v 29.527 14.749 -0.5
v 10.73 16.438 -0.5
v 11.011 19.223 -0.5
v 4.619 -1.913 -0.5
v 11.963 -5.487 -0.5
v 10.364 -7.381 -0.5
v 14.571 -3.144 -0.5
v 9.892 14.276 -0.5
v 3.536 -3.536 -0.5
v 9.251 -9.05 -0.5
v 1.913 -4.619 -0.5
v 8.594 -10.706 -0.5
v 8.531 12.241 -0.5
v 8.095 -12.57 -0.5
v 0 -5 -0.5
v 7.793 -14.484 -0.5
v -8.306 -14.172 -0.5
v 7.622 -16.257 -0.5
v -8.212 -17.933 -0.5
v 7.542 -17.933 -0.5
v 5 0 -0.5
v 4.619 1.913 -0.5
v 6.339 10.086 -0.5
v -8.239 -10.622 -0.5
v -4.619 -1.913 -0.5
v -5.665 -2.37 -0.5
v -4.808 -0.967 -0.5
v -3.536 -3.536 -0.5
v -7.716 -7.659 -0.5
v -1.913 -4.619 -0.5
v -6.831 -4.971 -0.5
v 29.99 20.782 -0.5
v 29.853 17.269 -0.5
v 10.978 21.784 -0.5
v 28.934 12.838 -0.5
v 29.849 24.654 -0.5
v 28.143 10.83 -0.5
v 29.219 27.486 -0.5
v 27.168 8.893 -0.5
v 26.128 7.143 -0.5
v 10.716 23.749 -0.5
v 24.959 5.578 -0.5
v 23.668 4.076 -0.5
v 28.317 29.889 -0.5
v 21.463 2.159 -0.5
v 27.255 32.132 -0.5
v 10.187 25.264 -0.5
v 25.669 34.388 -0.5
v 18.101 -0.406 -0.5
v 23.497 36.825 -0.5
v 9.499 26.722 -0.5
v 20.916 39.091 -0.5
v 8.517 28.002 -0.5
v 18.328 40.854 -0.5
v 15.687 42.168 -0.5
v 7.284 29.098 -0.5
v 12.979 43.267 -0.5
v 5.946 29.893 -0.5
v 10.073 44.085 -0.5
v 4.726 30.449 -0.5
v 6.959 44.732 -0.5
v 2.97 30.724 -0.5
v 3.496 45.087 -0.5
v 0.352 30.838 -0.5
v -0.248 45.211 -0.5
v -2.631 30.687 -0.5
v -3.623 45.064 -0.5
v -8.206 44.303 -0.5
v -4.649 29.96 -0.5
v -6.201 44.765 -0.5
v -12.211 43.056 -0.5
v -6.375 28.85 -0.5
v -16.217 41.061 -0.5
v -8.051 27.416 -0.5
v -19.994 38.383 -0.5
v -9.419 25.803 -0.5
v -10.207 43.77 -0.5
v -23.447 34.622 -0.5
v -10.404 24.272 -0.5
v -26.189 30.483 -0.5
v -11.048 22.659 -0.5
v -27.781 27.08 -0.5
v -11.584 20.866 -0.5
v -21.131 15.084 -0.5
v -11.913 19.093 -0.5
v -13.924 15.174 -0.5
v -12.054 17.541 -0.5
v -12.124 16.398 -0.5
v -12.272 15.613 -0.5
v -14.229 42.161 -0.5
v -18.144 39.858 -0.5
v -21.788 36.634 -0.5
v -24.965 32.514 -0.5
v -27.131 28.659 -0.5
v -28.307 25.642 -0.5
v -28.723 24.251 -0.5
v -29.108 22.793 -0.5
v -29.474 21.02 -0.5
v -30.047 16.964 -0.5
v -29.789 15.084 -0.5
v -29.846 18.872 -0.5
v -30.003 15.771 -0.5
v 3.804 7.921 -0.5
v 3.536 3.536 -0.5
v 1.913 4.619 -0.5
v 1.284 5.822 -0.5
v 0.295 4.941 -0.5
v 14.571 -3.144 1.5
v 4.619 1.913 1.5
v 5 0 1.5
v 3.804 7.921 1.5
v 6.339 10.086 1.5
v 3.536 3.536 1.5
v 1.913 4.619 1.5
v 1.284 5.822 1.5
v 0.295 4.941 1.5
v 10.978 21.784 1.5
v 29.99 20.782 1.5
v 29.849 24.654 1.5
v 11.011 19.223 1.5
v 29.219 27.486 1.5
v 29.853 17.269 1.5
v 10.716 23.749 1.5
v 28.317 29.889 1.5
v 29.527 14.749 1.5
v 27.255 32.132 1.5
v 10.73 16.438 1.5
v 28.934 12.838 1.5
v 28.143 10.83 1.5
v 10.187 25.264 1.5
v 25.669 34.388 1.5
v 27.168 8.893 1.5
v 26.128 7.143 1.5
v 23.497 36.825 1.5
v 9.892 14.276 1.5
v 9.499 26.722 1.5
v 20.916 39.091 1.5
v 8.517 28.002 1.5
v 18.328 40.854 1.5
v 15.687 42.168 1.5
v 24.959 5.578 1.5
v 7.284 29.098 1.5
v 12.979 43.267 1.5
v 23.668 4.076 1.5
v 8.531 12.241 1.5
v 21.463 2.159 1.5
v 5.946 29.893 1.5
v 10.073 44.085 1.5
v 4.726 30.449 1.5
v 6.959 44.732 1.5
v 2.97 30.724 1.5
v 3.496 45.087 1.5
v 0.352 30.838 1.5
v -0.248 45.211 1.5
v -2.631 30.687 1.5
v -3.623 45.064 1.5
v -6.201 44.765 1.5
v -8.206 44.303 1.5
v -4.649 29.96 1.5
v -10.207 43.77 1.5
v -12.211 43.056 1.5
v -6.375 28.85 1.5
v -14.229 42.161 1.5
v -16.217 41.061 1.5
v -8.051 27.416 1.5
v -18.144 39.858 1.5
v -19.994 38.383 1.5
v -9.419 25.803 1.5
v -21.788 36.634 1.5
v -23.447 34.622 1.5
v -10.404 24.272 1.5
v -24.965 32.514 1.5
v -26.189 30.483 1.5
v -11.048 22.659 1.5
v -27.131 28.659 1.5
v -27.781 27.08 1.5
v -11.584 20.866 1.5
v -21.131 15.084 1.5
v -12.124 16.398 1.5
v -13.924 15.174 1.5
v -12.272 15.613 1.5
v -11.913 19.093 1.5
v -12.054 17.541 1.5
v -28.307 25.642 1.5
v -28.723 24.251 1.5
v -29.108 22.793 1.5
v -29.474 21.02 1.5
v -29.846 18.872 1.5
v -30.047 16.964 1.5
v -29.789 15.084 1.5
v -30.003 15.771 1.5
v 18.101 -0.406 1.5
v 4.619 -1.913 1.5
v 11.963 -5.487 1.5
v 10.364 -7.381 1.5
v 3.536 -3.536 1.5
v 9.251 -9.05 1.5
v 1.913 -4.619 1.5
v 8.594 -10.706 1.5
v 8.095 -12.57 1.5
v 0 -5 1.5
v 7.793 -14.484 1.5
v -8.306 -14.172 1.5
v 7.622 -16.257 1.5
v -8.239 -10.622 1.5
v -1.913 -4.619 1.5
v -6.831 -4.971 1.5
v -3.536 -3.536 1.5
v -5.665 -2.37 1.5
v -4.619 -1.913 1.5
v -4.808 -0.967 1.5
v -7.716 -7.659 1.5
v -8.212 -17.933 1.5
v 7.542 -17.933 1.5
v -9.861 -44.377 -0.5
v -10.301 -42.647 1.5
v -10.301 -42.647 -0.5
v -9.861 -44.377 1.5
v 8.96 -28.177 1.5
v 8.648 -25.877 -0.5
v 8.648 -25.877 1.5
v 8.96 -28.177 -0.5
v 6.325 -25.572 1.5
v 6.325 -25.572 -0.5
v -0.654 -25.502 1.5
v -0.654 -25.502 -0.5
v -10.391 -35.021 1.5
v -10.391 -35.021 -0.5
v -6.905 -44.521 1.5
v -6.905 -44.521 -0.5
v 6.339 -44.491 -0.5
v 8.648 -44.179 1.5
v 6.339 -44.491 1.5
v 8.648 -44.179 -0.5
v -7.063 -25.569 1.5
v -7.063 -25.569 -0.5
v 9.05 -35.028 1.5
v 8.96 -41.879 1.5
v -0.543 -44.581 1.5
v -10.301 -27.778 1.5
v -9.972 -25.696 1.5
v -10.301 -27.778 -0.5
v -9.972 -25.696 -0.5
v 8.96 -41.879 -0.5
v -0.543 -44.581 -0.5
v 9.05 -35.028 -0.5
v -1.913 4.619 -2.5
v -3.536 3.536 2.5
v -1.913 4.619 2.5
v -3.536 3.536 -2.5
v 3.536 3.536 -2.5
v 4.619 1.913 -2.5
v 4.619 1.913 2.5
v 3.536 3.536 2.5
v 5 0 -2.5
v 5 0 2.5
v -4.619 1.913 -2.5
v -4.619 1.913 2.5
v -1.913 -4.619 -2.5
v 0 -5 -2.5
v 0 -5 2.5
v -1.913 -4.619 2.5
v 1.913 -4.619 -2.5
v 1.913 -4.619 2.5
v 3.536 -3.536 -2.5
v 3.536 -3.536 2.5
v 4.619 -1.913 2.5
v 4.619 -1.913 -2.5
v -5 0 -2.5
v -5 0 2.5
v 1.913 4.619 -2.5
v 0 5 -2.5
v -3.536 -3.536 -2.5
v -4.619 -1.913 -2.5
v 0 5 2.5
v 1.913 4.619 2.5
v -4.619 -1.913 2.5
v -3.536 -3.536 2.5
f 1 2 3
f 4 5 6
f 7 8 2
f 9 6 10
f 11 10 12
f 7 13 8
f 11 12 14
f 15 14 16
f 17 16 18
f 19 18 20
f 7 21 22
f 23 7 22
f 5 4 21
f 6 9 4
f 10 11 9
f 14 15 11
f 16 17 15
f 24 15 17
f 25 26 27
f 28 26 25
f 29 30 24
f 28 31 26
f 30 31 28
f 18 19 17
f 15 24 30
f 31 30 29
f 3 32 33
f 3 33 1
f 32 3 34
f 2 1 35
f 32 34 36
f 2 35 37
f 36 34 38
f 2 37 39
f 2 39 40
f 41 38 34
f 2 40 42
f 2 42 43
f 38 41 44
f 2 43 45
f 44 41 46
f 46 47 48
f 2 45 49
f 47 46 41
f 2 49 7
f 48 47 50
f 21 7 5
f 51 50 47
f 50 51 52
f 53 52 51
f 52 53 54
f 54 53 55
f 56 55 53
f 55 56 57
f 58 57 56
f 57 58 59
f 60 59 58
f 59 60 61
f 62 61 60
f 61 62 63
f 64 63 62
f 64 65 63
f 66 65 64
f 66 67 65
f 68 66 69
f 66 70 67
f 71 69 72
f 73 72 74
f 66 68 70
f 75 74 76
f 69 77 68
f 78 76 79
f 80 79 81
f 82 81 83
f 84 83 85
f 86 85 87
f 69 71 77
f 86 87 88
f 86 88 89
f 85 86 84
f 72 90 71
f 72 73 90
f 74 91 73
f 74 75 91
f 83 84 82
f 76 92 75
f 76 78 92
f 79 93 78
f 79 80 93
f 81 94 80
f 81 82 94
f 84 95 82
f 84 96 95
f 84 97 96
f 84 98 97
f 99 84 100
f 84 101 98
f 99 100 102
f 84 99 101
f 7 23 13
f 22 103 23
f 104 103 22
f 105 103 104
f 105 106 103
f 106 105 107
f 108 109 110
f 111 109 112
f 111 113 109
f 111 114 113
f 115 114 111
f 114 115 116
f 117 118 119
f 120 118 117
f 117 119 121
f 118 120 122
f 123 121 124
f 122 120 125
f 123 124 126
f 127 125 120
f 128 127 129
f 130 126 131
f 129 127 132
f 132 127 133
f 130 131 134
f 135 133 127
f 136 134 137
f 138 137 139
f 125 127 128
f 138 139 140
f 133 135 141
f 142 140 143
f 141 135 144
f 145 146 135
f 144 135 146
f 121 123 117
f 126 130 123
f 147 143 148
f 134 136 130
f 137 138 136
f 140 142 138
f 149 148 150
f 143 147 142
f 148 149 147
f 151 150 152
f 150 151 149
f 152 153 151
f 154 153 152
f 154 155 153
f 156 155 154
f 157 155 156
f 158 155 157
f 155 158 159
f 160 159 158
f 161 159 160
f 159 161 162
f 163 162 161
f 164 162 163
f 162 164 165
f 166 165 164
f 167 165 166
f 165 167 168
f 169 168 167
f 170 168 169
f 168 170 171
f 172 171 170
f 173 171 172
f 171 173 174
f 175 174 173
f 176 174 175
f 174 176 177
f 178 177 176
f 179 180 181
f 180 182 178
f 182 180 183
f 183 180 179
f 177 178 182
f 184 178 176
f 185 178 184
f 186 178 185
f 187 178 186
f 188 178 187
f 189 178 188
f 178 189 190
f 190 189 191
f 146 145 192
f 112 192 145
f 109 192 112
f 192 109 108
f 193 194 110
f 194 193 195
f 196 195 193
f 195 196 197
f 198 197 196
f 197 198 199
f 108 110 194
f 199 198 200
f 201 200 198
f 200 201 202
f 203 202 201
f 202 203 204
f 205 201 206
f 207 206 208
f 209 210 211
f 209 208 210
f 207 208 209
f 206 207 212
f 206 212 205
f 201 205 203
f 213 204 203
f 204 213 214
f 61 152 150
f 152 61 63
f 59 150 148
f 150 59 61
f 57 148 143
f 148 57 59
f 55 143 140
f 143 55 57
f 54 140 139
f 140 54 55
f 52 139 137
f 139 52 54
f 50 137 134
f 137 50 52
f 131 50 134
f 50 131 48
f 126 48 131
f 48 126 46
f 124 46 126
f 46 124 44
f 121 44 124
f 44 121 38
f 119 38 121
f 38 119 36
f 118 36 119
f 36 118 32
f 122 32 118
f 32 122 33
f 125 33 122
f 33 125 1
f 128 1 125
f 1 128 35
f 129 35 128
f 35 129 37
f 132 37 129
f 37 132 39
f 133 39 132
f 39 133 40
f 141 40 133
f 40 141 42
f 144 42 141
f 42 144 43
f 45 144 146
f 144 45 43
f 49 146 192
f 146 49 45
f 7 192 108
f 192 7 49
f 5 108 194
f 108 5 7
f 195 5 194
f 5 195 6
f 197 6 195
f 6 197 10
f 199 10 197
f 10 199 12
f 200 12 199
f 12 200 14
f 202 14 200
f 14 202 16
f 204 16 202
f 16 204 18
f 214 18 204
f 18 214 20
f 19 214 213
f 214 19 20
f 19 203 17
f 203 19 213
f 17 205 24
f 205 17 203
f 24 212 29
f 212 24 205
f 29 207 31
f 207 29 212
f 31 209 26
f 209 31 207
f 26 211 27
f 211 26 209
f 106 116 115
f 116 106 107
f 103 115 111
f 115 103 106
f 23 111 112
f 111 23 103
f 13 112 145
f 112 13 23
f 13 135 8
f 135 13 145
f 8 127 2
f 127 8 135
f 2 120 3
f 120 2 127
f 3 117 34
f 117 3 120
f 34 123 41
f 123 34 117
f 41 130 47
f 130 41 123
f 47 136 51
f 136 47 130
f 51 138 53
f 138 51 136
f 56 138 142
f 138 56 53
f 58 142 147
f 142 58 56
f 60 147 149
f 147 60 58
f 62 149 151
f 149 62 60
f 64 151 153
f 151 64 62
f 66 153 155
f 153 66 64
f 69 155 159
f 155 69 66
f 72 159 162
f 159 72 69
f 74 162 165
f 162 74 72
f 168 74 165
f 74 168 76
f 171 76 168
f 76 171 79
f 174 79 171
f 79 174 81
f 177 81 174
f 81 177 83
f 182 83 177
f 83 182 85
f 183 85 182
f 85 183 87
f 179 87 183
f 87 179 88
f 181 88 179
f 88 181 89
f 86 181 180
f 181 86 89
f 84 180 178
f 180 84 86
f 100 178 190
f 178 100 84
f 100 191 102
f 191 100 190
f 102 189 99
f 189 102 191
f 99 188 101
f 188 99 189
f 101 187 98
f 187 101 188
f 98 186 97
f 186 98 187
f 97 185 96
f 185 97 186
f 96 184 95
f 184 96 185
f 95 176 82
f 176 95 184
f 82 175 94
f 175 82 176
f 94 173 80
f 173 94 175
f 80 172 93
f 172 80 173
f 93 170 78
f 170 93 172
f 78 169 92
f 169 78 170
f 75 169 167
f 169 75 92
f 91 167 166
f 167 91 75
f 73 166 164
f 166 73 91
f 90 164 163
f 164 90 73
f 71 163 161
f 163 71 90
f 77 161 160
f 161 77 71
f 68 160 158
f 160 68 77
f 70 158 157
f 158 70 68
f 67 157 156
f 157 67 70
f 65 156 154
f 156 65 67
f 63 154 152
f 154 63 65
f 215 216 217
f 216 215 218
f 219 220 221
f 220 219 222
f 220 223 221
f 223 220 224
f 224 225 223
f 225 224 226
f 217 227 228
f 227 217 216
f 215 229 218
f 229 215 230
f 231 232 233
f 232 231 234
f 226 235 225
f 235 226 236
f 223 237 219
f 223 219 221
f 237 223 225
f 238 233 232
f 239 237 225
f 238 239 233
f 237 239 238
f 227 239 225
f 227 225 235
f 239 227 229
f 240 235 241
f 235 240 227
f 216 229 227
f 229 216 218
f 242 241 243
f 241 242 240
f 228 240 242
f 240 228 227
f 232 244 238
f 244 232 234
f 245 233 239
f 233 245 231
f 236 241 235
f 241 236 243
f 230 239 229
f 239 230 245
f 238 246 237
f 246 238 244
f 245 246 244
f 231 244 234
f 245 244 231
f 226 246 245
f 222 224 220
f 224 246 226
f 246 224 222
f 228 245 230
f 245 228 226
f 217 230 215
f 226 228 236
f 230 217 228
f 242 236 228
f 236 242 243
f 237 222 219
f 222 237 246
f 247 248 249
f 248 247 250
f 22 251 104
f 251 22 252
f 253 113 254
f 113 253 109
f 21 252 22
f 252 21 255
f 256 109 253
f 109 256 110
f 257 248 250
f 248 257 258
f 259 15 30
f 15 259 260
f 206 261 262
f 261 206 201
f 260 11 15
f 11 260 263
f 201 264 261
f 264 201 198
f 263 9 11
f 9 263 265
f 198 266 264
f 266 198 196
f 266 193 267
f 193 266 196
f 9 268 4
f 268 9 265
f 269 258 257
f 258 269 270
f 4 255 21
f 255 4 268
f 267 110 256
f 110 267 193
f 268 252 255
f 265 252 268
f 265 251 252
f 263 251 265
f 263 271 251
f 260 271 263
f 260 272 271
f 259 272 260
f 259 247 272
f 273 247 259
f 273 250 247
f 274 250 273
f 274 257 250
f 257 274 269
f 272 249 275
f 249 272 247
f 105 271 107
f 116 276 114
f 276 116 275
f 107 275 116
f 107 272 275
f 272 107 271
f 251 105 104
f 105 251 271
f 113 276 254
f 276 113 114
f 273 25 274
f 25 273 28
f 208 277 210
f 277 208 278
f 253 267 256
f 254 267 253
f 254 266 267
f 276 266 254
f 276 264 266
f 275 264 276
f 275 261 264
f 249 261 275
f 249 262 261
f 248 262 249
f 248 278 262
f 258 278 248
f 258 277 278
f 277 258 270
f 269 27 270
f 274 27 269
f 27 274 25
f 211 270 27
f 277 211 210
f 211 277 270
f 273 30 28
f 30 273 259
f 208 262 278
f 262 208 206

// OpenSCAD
//------------------------------------------------------------
//	Stencil-o-Matic (modified for RossRobotics)
//
//	input comes from:
//	http://chaaawa.com/stencil_factory/
//
//	http://thingiverse.com/Benjamin
//	http://www.thingiverse.com/thing:55821
//------------------------------------------------------------

// preview[view:south, tilt:top]

// paste here after "Convert&Copy"
input = "no_input";

stencil_thickness = 1;
stencil_width = 80;
//for margin
margin = 10;

// If you don't want to center
offX = 0;
offY = 0;

module void() {}

cylinder(5,5,5, center=true);

dispo_width = stencil_width - 2*margin;

points_array = (input=="no_input"? [[179,268],[[199.26,15.12],[189.19,15.56],[181.5,16.45],[175.52,17.83],[169.55,19.42],[163.57,21.55],[157.55,24.22],[151.62,27.5],[145.87,31.09],[140.35,35.49],[135,40.71],[130.05,46.71],[125.52,53],[121.87,59.06],[119.06,64.5],[117.12,69.21],[115.55,73.5],[114.31,77.65],[113.16,82],[112.07,87.29],[110.96,93.7],[110.36,99.39],[110.49,102.95],[111.13,105],[136.96,105],[158.46,104.73],[163.39,103.42],[163.83,101.08],[164.04,97.67],[164.46,93.04],[165.44,87.75],[167.04,82.4],[168.96,77.59],[171.9,73.02],[175.98,68.21],[180.98,63.93],[186.13,60.62],[192.15,58.45],[201.05,58],[208.86,58.34],[214.1,59.16],[217.74,60.82],[221.73,63.19],[225.41,66.46],[228.34,70.28],[230.39,74.63],[231.97,79.15],[232.75,85.01],[232.85,92.65],[232.01,100.96],[229.51,107.41],[225.45,113.48],[218.91,119.91],[211.35,126.37],[203.83,132.63],[197.2,138.54],[191.77,144.13],[187.33,150.15],[183.1,157.07],[179.62,164.83],[176.98,172.85],[175.42,181.69],[175.22,192.28],[175.5,203.5],[199,203.5],[222.5,203.5],[222.74,198.5],[223.25,193.21],[224.15,187.5],[225.64,181.94],[227.6,177],[230.92,172.02],[235.69,166.37],[243.47,159.38],[254,151.21],[264.03,143.56],[270.61,137.84],[274.46,133.36],[277.95,128.69],[281.05,123.47],[283.96,117.69],[286.32,111.7],[288.09,106],[289.06,98.48],[289.47,88],[289.05,76.45],[287.17,68],[284.48,60.83],[281.31,54.14],[276.58,47.41],[270.1,40.14],[262.4,33.38],[254.68,28.12],[246.8,24.2],[238.72,20.92],[230.05,18.48],[220.76,16.55],[210.43,15.49],[199.26,15.12]],[[198.05,226.08],[178.93,226.28],[170.25,226.66],[169.27,232.87],[169,254.48],[169.27,277.23],[170.58,282.39],[179.4,282.82],[198.38,283],[218.91,282.73],[225.8,281.8],[226.73,274.94],[227,254.5],[226.73,234.06],[225.8,227.2],[218.87,226.29],[198.05,226.08]]]: input);

input_width = points_array[0][0];
input_height= points_array[0][1];
sTrace = dispo_width/input_width;
stencil_height = input_height*sTrace + 2*margin;


	translate([offX, offY, -stencil_thickness/2])
	scale([sTrace, -sTrace, 1])
	translate([-200, -150, 0]) {
		union() {
			for (i = [1:len(points_array) -1] ) {
				linear_extrude(height=stencil_thickness*2) {polygon(points_array[i]);}
			}
		}
	}
